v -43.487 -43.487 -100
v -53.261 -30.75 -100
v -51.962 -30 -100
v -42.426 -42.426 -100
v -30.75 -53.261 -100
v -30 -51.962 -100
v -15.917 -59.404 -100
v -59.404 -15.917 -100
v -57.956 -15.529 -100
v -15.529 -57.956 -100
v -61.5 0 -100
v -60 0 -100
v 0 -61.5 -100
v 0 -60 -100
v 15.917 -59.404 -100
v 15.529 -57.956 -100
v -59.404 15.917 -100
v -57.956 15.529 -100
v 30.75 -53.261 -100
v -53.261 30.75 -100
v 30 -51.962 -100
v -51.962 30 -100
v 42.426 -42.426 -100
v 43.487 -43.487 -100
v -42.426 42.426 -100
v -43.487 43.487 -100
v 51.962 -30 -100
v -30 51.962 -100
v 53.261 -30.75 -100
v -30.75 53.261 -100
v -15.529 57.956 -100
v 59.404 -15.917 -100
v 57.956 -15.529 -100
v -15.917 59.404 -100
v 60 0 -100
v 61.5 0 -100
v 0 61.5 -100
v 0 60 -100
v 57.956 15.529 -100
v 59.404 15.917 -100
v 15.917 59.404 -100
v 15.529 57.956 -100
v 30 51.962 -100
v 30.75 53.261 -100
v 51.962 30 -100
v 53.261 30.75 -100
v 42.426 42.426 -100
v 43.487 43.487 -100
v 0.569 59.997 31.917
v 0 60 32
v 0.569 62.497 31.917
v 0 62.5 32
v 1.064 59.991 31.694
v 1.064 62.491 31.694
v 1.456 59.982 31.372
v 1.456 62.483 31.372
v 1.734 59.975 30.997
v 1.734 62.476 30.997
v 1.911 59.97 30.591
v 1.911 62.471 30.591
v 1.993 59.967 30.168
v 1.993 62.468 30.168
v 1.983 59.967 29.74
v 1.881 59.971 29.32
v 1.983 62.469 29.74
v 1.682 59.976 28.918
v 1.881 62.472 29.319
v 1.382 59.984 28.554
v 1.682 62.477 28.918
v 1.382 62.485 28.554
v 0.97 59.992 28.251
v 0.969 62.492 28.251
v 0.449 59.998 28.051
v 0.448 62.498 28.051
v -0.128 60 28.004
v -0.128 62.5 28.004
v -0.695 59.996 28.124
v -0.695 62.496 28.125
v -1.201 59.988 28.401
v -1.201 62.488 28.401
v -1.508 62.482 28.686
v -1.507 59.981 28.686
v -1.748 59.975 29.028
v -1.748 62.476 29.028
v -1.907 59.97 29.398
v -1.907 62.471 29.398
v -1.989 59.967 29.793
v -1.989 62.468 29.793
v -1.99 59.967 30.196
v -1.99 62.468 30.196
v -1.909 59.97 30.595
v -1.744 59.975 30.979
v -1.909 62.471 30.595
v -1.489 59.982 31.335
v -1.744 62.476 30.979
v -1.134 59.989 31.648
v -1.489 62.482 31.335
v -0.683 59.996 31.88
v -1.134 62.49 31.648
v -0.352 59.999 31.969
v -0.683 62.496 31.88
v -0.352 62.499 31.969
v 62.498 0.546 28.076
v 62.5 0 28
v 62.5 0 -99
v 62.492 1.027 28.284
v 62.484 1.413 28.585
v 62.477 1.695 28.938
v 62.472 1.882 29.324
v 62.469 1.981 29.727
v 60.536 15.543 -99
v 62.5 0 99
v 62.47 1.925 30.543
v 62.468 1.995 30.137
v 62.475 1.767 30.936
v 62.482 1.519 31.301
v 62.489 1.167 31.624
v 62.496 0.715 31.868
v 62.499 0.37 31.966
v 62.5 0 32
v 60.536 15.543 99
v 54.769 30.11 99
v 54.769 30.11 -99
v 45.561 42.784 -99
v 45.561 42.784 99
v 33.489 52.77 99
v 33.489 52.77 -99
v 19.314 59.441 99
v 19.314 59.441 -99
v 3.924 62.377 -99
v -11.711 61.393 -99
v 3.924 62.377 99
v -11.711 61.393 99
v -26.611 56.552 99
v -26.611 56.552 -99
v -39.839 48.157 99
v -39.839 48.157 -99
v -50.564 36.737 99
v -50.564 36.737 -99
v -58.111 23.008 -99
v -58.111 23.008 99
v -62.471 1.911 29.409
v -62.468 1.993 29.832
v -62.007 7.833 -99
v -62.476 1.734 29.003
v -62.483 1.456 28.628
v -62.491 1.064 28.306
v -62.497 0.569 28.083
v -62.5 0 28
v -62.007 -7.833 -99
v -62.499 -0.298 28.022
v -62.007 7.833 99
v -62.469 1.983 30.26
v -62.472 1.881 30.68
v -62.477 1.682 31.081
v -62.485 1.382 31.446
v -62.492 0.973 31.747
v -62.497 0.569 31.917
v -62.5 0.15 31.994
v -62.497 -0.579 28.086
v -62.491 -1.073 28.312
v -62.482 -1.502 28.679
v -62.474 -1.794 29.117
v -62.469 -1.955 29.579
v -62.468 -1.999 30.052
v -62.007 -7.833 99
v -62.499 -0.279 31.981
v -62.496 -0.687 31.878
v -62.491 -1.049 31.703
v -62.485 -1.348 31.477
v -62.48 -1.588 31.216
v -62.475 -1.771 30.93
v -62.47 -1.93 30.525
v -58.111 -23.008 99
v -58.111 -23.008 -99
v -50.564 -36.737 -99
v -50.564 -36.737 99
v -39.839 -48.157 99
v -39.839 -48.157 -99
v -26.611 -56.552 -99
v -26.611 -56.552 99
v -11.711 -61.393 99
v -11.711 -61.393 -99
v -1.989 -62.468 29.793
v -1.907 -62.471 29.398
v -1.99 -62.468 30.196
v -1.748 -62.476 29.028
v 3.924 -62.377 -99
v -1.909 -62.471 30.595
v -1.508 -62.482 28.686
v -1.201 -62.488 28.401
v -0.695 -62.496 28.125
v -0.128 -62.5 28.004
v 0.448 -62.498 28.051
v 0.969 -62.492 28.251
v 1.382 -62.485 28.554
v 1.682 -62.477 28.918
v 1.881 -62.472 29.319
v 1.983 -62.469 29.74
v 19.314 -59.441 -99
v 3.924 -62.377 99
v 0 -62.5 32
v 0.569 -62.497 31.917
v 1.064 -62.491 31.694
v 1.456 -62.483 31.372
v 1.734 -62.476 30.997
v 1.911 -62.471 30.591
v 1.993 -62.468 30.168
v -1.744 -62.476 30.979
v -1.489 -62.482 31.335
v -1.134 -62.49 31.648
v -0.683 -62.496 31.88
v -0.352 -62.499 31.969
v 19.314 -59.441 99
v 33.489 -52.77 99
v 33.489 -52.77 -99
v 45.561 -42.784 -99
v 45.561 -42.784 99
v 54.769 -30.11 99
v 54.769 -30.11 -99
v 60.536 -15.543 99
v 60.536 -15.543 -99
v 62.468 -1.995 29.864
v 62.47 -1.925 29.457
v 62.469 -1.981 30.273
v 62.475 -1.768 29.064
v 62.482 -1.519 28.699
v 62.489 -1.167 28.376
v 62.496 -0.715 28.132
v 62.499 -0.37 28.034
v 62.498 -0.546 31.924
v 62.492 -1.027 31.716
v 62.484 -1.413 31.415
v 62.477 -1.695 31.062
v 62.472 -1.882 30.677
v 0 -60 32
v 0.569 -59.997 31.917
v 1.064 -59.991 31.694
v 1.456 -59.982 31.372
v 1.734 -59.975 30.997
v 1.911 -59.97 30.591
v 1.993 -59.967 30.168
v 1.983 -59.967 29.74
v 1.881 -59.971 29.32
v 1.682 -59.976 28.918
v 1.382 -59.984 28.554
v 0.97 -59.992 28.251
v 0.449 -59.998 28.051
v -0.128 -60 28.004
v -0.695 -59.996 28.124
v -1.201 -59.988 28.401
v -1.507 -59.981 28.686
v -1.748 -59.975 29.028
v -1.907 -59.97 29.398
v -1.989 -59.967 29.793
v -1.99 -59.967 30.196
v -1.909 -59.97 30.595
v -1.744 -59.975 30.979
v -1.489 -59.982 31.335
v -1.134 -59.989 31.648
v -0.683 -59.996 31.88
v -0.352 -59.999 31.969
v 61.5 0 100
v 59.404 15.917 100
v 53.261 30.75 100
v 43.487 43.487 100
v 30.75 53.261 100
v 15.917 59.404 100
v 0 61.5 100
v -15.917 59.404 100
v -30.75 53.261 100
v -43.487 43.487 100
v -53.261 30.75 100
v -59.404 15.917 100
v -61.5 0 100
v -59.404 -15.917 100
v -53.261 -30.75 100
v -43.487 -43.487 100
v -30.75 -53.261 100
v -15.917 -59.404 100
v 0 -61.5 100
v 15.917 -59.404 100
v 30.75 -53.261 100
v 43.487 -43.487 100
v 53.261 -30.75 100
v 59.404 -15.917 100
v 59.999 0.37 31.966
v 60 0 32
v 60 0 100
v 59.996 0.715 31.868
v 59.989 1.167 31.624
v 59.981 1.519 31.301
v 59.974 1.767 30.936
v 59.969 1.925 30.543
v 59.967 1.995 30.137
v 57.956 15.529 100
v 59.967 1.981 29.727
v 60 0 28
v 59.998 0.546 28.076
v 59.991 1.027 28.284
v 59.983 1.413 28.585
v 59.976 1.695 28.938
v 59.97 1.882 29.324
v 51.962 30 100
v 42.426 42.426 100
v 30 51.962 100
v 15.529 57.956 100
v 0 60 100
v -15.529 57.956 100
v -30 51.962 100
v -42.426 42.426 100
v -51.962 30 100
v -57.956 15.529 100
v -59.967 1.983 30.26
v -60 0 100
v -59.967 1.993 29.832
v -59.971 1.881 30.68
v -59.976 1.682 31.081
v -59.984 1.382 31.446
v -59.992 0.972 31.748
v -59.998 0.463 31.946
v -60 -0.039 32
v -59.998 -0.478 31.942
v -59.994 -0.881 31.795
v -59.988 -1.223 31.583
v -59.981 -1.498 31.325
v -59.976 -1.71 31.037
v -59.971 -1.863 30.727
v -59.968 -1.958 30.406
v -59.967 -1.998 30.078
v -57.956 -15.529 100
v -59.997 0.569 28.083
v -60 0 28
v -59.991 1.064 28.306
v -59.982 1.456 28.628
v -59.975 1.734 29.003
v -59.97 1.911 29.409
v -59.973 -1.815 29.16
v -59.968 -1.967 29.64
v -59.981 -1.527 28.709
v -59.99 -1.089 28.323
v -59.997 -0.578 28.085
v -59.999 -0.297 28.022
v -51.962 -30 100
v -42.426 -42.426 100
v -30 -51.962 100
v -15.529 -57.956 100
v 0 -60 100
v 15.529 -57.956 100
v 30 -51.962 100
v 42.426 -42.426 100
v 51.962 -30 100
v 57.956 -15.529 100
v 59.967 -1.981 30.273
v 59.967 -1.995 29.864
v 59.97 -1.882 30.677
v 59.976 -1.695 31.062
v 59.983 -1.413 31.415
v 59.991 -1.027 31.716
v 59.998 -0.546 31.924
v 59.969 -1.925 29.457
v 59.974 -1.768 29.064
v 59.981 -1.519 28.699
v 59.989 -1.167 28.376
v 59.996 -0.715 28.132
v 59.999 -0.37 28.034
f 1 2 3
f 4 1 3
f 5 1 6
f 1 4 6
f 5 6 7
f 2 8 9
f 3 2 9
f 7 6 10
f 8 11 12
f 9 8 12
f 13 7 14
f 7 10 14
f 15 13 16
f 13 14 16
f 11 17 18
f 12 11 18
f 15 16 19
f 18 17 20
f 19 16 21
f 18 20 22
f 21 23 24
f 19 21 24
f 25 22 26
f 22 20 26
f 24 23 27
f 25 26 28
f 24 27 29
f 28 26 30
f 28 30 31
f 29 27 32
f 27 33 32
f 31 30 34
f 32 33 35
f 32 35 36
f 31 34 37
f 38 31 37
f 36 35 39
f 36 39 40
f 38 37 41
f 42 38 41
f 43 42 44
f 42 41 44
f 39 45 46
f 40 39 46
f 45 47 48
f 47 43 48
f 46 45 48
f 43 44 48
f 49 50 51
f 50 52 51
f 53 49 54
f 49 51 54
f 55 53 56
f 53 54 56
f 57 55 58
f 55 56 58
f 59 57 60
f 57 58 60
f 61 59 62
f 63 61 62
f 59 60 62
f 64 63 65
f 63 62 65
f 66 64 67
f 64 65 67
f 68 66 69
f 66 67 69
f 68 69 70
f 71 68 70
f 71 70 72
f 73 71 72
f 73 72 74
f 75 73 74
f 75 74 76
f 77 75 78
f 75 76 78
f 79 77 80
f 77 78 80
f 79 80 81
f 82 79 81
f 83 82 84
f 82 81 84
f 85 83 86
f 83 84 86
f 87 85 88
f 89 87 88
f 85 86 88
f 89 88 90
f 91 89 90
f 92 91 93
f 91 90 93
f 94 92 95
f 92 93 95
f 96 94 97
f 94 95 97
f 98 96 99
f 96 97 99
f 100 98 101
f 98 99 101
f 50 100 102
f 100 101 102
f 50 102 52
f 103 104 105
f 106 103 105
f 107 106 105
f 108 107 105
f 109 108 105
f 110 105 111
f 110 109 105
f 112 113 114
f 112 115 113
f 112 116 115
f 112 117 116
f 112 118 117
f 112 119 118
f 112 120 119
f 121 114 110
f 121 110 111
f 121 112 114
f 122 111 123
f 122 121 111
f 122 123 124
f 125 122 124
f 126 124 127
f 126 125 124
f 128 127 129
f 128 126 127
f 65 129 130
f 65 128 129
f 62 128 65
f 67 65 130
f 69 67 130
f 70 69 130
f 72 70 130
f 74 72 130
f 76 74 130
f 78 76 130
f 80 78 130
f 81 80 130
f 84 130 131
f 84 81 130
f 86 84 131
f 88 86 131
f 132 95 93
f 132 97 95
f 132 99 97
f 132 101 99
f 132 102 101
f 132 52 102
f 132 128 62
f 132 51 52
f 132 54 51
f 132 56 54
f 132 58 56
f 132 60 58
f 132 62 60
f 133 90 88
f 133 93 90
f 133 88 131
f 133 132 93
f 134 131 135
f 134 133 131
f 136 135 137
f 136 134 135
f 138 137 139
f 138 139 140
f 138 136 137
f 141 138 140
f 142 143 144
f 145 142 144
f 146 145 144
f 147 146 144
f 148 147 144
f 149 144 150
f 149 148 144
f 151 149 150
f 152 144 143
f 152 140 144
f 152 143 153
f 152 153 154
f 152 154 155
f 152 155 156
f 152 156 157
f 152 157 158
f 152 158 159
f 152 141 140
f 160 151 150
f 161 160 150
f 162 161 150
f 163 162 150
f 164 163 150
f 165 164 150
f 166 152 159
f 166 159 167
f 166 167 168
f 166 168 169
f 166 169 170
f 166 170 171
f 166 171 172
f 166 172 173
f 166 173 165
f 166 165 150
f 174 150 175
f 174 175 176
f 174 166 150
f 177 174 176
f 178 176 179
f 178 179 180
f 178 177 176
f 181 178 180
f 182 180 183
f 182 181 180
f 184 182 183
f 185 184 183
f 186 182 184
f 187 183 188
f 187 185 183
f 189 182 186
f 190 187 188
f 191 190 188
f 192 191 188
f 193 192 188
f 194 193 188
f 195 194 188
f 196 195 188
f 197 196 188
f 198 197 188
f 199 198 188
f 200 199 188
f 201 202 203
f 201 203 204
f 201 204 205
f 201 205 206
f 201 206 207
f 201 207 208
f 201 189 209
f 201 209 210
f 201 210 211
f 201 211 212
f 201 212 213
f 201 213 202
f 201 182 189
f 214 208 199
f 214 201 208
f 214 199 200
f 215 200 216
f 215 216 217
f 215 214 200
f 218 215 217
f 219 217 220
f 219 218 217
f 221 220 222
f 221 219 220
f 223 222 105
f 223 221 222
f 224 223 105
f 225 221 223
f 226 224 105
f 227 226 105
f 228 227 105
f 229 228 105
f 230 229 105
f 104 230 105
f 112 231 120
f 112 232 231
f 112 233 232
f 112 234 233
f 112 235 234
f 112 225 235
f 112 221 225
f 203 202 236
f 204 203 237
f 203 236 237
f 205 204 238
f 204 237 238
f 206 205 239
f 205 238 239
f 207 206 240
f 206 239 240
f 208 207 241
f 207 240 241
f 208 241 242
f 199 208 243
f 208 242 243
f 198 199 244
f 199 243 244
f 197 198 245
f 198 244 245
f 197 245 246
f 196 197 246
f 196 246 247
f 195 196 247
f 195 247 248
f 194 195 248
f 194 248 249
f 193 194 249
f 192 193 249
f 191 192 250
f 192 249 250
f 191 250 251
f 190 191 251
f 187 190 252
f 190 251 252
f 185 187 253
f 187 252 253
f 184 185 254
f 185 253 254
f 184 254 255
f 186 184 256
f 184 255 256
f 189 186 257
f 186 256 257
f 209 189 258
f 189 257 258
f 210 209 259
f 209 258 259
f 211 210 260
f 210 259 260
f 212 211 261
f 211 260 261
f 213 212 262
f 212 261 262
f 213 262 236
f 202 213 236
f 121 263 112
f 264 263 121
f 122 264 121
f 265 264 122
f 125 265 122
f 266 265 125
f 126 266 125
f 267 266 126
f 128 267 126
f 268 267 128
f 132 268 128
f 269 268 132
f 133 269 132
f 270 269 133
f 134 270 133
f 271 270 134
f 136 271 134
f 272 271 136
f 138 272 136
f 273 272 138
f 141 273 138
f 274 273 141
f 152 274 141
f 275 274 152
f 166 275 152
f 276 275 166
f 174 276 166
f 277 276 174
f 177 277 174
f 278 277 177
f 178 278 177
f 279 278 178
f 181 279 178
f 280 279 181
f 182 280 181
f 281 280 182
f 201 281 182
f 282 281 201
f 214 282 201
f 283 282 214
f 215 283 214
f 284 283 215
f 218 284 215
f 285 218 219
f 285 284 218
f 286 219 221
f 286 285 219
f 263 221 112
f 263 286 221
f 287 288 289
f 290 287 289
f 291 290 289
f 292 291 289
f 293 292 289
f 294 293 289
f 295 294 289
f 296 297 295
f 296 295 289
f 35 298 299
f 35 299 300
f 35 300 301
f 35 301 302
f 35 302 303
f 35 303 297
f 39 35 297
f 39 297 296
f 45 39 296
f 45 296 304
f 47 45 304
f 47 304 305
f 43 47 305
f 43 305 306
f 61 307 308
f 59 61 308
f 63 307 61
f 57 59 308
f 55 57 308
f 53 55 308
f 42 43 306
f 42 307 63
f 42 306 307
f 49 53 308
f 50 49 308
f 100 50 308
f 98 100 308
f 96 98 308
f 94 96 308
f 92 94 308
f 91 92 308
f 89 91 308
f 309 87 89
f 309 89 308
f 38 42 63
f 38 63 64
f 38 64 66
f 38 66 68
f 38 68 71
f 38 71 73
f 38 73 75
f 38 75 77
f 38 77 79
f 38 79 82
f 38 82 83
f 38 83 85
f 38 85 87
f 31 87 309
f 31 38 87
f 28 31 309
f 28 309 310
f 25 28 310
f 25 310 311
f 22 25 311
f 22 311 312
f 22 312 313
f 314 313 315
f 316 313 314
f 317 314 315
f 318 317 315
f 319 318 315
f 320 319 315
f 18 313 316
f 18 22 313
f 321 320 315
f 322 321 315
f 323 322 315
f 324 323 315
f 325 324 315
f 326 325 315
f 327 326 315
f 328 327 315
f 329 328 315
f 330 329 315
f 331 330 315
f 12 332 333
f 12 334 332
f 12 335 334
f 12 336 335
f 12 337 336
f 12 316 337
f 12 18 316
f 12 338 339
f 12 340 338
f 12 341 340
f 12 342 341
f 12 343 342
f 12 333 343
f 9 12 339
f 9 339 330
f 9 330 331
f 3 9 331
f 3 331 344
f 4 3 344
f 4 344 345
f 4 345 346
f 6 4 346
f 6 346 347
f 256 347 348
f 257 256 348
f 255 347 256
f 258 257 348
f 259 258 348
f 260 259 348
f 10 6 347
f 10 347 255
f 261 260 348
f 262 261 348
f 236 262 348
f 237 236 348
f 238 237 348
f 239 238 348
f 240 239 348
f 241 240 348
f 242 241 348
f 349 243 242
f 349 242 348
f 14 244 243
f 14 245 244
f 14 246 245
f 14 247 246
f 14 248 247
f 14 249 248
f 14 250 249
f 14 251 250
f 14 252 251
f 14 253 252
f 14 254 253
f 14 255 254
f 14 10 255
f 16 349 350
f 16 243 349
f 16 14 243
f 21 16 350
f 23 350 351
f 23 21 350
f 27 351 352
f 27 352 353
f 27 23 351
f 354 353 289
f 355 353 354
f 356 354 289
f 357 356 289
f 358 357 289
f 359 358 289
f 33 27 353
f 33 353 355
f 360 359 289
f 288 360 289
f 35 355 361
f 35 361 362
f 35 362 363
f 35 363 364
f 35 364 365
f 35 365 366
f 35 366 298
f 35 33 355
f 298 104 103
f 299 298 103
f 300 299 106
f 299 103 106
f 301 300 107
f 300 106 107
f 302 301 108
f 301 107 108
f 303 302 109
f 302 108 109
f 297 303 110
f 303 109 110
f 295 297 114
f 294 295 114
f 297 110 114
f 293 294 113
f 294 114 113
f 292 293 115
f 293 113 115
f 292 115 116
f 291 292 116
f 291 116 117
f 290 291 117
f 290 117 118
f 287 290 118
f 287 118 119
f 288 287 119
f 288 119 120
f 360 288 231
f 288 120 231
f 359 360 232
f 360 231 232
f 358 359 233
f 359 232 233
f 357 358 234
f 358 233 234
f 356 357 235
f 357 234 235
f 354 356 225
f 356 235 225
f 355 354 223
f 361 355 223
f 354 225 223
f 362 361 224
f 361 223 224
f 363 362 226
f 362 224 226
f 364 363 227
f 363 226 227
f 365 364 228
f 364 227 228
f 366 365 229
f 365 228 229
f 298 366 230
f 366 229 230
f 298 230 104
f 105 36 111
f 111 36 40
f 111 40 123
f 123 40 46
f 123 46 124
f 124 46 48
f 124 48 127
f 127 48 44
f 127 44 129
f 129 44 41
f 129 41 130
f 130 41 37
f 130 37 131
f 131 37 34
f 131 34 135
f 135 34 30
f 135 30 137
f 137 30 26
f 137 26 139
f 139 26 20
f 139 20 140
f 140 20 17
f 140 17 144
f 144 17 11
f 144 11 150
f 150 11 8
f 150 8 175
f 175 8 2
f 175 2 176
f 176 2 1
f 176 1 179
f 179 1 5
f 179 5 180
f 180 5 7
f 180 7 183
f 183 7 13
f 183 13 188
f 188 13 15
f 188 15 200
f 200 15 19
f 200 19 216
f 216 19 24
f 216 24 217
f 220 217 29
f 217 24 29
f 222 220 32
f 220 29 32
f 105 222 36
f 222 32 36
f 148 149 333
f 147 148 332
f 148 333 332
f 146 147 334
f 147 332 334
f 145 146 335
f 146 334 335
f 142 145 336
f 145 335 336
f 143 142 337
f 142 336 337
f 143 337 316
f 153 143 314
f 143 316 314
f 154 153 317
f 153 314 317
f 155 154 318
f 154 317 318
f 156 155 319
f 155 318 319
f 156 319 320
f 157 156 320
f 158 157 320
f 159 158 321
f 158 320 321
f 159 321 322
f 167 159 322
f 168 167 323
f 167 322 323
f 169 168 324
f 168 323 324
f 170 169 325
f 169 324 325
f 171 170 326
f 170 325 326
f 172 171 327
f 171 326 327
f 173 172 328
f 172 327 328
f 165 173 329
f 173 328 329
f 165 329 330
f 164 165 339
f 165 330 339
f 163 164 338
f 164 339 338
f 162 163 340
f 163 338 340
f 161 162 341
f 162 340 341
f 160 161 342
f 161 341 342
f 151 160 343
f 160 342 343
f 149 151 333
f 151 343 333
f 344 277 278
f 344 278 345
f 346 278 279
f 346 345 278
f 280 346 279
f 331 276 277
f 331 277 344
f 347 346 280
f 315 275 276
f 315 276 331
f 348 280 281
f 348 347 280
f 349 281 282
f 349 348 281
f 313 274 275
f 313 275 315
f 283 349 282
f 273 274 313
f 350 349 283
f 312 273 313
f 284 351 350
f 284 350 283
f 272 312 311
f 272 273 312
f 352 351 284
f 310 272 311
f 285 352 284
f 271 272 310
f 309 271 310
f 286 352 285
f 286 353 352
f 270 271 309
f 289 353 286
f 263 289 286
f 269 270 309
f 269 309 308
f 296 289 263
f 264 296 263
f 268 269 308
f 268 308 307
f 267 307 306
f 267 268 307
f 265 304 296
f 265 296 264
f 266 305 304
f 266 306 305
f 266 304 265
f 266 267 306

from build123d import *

# Parameters (mm, degrees)
SKETCH1_R           = 62.5
SKETCH1_R_2         = 60
BOSS_EXTRUDE1_DEPTH = 100
SKETCH2_R           = 2
CUT_EXTRUDE1_DEPTH  = 100
SKETCH3_R           = 2
CUT_EXTRUDE2_DEPTH  = 74
CHAMFER1_SIZE       = 1
CHAMFER2_SIZE       = 1


with BuildPart() as part:
    # Sketch1 → Boss-Extrude1 (new, symmetric)
    with BuildSketch(Plane.XY):
        Circle(SKETCH1_R)
        Circle(SKETCH1_R_2, mode=Mode.SUBTRACT)
    extrude(amount=BOSS_EXTRUDE1_DEPTH, both=True)

    # Sketch2 → Cut-Extrude1 (cut, symmetric)
    with BuildSketch(Plane(origin=(0, 0, 0), x_dir=(1, 0, 0), z_dir=(0, 1, 0))):
        with Locations(Location((0, -30, 0), (0, 0, 270))):
            Circle(SKETCH2_R)
    extrude(amount=CUT_EXTRUDE1_DEPTH, both=True, mode=Mode.SUBTRACT)

    # Sketch3 → Cut-Extrude2 (cut, symmetric)
    with BuildSketch(Plane(origin=(0, 0, 0), x_dir=(0, 0, -1), z_dir=(1, 0, 0))):
        with Locations((-30, 0)):
            Circle(SKETCH3_R)
    extrude(amount=CUT_EXTRUDE2_DEPTH, both=True, mode=Mode.SUBTRACT)

    # Chamfer1
    chamfer1_edges = [part.edges().sort_by_distance(p)[0] for p in [
        (-62.5, 0, 100),
    ]]
    chamfer(chamfer1_edges, length=CHAMFER1_SIZE)

    # Chamfer2
    chamfer2_edges = [part.edges().sort_by_distance(p)[0] for p in [
        (-62.5, 0, -100),
    ]]
    chamfer(chamfer2_edges, length=CHAMFER2_SIZE)


solid = part.part
